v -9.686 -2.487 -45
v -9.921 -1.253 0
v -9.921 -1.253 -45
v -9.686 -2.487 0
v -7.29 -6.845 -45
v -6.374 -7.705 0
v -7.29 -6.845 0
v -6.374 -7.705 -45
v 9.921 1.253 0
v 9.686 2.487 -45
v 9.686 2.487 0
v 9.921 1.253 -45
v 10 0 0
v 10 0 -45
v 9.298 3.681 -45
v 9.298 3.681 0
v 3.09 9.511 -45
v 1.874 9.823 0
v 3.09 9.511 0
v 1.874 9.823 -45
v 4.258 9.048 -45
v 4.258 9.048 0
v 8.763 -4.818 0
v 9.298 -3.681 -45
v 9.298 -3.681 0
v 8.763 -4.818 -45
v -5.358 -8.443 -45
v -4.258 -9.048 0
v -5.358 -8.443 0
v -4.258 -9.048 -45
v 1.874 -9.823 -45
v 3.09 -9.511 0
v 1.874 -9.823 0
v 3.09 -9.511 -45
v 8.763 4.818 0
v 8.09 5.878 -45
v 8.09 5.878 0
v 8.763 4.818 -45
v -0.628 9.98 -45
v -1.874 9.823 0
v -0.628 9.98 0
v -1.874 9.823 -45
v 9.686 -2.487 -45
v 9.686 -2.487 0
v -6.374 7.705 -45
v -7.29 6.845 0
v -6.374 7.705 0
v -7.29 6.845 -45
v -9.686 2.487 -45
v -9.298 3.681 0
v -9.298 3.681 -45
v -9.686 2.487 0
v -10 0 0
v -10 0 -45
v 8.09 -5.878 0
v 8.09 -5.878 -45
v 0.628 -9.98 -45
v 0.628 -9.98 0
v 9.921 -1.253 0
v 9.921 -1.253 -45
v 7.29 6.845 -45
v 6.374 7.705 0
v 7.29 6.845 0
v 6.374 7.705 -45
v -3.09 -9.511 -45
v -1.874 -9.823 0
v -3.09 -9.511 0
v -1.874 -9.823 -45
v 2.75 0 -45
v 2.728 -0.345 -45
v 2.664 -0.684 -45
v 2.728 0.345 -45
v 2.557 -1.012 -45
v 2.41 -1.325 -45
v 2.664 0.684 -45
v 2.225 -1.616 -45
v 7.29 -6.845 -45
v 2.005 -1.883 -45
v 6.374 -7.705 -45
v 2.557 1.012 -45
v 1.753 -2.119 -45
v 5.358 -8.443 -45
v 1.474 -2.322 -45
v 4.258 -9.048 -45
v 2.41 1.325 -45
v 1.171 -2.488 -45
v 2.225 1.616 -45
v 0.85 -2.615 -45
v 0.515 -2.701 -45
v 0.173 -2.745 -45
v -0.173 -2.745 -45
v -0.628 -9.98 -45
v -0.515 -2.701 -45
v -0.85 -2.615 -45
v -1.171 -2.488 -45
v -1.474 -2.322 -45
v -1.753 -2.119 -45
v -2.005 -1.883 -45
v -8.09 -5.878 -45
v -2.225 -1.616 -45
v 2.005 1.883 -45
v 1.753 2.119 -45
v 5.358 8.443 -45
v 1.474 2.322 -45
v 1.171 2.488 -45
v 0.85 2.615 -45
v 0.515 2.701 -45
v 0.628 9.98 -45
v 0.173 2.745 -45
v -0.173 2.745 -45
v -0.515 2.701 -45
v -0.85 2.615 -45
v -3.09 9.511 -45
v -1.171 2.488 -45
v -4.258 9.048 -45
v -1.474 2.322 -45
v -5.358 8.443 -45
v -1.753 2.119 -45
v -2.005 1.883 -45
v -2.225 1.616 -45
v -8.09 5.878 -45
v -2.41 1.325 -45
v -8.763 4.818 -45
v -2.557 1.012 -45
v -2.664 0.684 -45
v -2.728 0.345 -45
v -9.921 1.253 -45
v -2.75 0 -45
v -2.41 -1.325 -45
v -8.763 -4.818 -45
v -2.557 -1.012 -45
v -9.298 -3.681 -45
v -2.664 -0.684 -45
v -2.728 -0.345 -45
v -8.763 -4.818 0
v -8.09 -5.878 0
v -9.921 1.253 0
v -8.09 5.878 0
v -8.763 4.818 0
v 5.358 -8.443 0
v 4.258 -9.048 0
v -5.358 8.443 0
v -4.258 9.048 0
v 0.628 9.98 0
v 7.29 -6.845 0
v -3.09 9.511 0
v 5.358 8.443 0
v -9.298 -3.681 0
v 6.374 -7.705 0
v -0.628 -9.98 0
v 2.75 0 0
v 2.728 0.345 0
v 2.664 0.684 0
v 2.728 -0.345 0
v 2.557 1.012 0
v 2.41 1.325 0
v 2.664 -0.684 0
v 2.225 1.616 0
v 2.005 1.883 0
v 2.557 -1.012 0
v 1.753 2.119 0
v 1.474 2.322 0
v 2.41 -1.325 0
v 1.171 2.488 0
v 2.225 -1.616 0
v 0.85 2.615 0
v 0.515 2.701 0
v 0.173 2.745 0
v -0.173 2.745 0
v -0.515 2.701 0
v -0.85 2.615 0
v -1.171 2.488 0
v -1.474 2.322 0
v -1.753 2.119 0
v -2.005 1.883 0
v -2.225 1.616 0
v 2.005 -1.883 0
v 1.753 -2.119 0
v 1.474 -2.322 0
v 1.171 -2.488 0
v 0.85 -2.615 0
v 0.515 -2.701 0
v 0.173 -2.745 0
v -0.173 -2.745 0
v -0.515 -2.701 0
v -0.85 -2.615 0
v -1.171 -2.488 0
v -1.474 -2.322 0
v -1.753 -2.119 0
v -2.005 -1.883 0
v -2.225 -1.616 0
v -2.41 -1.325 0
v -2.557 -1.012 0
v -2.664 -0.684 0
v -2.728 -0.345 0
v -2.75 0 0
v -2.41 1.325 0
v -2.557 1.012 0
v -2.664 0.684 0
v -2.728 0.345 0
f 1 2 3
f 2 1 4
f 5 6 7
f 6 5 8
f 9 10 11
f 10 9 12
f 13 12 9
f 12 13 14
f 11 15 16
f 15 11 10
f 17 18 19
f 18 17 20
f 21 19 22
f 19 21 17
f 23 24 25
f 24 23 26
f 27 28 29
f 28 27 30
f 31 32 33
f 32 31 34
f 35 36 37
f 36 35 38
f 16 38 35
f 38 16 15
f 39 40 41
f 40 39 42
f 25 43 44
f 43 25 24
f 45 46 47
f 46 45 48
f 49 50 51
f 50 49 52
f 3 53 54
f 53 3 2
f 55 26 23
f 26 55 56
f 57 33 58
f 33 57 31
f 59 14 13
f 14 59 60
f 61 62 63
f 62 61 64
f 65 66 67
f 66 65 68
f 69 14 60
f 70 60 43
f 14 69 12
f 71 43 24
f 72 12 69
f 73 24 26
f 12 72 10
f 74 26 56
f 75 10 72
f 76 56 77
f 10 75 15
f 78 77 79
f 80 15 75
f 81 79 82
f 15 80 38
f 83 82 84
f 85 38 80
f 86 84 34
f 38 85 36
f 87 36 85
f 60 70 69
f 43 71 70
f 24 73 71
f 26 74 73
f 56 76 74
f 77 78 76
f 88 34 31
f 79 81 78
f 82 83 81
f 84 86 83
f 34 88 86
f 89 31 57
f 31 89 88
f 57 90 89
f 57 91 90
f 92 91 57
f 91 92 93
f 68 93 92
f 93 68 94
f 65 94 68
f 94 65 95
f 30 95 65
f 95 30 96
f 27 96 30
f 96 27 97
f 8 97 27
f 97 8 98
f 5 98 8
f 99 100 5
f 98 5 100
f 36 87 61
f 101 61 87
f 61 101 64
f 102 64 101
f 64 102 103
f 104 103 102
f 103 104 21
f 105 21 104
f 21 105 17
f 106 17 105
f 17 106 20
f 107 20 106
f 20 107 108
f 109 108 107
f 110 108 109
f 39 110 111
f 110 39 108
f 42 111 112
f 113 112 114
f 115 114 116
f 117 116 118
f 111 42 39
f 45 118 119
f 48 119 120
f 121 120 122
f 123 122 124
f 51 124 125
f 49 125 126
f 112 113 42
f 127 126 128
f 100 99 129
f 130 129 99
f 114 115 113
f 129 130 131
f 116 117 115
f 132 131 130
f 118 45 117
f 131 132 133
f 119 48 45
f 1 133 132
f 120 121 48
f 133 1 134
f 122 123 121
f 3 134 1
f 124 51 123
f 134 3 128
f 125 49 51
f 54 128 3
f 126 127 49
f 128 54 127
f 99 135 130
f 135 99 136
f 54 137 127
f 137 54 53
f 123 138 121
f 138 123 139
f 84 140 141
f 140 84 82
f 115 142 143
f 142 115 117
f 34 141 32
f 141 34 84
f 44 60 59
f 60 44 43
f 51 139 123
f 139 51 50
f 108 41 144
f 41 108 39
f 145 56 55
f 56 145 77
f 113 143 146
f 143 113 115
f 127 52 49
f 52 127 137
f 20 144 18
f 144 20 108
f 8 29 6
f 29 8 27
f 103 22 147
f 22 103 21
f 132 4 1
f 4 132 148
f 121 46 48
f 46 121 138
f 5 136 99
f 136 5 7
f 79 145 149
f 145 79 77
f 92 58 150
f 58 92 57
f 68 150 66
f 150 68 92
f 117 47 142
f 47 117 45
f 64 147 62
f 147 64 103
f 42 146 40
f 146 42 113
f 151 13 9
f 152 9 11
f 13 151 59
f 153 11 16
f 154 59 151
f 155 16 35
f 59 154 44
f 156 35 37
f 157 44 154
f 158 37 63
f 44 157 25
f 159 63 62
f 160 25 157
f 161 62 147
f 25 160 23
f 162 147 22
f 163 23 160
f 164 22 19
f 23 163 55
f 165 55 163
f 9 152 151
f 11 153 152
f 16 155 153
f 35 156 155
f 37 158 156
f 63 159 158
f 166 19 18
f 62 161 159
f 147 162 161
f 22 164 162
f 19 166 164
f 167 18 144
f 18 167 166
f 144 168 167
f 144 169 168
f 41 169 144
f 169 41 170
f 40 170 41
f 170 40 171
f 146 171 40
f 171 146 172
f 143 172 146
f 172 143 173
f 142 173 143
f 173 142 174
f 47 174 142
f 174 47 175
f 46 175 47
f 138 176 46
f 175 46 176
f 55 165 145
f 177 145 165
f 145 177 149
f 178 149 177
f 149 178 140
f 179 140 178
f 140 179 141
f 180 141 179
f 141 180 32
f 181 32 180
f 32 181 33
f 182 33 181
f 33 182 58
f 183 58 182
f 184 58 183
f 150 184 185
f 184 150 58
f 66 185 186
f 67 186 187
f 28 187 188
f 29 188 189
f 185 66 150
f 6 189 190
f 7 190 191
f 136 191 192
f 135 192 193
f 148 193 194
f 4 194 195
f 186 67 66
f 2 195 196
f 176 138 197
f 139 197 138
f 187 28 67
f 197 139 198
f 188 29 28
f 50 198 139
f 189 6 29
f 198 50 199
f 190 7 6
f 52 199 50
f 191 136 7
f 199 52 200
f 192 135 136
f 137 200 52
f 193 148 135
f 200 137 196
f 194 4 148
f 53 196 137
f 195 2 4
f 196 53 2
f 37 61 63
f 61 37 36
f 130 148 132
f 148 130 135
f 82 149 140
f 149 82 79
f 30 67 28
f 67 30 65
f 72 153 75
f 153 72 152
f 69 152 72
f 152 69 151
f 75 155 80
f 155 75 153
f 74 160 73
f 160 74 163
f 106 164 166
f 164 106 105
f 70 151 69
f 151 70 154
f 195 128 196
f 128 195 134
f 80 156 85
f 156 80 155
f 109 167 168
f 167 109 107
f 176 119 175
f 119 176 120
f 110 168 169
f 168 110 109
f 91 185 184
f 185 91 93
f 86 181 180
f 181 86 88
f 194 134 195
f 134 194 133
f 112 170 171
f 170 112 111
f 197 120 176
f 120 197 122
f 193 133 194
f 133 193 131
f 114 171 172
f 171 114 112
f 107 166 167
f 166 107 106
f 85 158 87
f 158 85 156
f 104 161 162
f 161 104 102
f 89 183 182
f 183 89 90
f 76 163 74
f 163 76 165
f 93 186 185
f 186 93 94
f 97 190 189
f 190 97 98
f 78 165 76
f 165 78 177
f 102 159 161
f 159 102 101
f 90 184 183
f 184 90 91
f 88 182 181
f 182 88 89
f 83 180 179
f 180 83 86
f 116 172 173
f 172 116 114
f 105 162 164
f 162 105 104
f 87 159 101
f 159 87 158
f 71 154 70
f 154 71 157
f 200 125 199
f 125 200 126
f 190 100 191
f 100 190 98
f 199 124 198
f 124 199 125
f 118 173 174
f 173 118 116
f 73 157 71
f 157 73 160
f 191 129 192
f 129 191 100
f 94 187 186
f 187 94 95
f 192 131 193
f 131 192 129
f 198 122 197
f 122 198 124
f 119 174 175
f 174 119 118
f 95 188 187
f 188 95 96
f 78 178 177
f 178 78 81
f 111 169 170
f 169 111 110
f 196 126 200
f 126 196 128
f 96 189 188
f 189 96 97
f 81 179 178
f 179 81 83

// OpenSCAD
$fn = 50;


difference() {
	union() {
		translate(v = [0, 0, -45.0000000000]) {
			cylinder(h = 45, r = 10.0000000000);
		}
		cylinder(h = 0, r = 16.0000000000);
	}
	union() {
		#translate(v = [0, 0, -45]) {
			cylinder(h = 45, r = 2.7500000000);
		}
	}
}
